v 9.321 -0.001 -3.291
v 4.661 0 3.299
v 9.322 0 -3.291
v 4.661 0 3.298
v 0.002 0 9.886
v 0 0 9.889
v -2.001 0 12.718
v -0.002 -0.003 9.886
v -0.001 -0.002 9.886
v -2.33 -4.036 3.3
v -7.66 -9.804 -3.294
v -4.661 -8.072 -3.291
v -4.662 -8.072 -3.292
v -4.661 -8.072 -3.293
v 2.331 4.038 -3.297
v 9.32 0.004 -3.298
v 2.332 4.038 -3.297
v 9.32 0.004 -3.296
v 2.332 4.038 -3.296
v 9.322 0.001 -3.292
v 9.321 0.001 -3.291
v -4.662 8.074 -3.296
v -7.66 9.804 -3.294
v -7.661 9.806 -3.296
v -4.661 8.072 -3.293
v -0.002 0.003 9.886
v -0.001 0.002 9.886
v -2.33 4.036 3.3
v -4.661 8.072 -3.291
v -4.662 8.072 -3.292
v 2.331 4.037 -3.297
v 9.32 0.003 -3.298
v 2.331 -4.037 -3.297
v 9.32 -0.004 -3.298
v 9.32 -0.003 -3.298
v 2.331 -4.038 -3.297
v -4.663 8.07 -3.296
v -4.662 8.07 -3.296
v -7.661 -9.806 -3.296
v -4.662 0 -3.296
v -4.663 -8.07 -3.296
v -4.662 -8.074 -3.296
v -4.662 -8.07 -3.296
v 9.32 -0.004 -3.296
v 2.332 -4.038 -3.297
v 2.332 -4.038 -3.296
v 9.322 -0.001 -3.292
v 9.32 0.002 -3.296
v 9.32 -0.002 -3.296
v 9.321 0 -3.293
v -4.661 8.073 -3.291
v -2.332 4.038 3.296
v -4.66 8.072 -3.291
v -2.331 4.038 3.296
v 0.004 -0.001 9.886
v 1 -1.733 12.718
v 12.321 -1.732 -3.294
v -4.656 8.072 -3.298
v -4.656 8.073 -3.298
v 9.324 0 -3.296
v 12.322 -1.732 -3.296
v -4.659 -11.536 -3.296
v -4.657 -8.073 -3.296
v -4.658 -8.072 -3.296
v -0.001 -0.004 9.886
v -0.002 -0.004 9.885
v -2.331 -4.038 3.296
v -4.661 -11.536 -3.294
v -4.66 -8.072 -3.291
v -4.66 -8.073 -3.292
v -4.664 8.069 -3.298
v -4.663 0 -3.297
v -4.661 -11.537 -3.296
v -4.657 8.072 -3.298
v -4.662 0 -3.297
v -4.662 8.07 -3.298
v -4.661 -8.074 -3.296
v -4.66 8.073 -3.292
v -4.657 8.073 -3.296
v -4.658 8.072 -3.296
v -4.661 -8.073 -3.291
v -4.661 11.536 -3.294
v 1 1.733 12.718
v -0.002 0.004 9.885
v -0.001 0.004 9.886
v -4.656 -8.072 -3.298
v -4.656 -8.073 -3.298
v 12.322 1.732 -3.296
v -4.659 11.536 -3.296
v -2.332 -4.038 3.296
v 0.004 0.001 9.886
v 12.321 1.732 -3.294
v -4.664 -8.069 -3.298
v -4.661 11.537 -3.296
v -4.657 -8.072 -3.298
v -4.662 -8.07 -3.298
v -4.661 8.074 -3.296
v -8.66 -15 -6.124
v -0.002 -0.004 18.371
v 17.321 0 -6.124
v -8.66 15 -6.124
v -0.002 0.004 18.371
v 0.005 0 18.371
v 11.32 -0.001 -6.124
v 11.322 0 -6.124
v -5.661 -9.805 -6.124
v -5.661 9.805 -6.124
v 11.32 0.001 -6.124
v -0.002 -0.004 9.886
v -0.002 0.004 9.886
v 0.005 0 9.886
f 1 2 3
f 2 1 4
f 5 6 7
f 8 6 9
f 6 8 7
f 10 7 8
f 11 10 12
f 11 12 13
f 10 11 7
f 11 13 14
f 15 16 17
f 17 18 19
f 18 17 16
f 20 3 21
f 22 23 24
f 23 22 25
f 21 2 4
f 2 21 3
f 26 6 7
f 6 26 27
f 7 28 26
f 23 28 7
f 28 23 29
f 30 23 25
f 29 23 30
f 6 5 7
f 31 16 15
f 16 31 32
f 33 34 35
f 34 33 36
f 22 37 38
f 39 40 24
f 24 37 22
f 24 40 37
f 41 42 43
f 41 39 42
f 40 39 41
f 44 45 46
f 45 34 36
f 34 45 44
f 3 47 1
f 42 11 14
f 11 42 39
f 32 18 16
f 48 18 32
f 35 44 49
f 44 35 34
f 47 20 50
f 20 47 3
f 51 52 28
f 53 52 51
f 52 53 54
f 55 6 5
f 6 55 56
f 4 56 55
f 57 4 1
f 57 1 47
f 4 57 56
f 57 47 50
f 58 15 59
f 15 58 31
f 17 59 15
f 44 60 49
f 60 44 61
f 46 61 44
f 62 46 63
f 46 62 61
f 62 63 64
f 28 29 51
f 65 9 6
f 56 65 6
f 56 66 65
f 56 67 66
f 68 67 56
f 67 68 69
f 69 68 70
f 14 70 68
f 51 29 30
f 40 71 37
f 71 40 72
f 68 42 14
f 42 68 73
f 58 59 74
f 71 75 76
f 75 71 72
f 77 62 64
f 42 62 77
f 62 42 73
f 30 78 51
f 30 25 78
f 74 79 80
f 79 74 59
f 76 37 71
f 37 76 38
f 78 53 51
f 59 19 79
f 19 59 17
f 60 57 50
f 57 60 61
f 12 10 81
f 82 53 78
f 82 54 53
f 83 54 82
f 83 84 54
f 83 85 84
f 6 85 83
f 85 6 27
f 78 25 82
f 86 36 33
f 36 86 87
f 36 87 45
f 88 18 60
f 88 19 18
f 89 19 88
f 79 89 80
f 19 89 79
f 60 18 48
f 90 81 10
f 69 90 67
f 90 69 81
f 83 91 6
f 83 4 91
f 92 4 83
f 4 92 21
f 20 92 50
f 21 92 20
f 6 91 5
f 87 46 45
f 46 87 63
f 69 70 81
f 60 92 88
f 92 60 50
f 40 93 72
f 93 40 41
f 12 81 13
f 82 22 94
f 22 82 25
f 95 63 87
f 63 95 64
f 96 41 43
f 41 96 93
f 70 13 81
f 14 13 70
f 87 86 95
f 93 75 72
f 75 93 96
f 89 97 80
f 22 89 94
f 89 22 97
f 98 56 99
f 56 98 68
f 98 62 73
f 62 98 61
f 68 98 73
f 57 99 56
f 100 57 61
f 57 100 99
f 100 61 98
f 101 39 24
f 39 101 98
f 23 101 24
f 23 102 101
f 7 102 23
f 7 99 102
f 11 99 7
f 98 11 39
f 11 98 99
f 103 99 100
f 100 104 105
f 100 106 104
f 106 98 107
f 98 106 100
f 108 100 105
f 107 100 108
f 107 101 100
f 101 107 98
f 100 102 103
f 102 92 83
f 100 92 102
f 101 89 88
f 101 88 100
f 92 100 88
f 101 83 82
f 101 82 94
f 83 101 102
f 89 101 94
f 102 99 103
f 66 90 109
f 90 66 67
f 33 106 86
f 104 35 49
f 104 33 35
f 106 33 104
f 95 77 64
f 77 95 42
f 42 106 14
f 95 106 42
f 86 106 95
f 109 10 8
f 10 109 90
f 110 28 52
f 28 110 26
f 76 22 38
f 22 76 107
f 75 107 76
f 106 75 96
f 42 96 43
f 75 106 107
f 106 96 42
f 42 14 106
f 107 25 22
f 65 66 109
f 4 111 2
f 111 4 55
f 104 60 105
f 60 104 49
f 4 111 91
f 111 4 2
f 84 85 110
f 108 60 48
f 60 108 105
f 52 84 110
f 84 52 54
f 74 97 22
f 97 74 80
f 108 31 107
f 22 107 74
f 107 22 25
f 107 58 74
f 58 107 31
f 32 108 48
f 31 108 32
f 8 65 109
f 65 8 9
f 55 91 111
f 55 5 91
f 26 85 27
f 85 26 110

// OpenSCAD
$fn = 100;
epsilon = 0.01;
nozzle_d = 0.4;

tetrahedron_stand();

module tetrahedron_stand(){
    // main parameters
    side = 30;
    edge_t = 3;

    // derived parameters
    tet_d = side * 2/ sqrt(3);
    tet_h = side * sqrt(6) / 3;
    tet_z = side * sqrt(6) / 12;
    tet_alpha = 60;
    tet_beta = atan(2 * sqrt(2));
    tet_gamma = atan(sqrt(2));

    cutout_z = tet_z + edge_t * sqrt(8);

    difference(){
        union() {
            translate([0,0,-tet_z]) cylinder($fn=3, h=tet_h, d1=tet_d, d2=epsilon);
        }

        // cut out
        translate([0,0,-cutout_z]) cylinder($fn=3, h=tet_h, d1=tet_d, d2=epsilon);
        for (i=[0:2]) {
            rotate([180, -tet_beta, i*120]) translate([0,0,-cutout_z]) cylinder($fn=3, h=tet_h, d1=tet_d, d2=epsilon);
        }
    }
}
